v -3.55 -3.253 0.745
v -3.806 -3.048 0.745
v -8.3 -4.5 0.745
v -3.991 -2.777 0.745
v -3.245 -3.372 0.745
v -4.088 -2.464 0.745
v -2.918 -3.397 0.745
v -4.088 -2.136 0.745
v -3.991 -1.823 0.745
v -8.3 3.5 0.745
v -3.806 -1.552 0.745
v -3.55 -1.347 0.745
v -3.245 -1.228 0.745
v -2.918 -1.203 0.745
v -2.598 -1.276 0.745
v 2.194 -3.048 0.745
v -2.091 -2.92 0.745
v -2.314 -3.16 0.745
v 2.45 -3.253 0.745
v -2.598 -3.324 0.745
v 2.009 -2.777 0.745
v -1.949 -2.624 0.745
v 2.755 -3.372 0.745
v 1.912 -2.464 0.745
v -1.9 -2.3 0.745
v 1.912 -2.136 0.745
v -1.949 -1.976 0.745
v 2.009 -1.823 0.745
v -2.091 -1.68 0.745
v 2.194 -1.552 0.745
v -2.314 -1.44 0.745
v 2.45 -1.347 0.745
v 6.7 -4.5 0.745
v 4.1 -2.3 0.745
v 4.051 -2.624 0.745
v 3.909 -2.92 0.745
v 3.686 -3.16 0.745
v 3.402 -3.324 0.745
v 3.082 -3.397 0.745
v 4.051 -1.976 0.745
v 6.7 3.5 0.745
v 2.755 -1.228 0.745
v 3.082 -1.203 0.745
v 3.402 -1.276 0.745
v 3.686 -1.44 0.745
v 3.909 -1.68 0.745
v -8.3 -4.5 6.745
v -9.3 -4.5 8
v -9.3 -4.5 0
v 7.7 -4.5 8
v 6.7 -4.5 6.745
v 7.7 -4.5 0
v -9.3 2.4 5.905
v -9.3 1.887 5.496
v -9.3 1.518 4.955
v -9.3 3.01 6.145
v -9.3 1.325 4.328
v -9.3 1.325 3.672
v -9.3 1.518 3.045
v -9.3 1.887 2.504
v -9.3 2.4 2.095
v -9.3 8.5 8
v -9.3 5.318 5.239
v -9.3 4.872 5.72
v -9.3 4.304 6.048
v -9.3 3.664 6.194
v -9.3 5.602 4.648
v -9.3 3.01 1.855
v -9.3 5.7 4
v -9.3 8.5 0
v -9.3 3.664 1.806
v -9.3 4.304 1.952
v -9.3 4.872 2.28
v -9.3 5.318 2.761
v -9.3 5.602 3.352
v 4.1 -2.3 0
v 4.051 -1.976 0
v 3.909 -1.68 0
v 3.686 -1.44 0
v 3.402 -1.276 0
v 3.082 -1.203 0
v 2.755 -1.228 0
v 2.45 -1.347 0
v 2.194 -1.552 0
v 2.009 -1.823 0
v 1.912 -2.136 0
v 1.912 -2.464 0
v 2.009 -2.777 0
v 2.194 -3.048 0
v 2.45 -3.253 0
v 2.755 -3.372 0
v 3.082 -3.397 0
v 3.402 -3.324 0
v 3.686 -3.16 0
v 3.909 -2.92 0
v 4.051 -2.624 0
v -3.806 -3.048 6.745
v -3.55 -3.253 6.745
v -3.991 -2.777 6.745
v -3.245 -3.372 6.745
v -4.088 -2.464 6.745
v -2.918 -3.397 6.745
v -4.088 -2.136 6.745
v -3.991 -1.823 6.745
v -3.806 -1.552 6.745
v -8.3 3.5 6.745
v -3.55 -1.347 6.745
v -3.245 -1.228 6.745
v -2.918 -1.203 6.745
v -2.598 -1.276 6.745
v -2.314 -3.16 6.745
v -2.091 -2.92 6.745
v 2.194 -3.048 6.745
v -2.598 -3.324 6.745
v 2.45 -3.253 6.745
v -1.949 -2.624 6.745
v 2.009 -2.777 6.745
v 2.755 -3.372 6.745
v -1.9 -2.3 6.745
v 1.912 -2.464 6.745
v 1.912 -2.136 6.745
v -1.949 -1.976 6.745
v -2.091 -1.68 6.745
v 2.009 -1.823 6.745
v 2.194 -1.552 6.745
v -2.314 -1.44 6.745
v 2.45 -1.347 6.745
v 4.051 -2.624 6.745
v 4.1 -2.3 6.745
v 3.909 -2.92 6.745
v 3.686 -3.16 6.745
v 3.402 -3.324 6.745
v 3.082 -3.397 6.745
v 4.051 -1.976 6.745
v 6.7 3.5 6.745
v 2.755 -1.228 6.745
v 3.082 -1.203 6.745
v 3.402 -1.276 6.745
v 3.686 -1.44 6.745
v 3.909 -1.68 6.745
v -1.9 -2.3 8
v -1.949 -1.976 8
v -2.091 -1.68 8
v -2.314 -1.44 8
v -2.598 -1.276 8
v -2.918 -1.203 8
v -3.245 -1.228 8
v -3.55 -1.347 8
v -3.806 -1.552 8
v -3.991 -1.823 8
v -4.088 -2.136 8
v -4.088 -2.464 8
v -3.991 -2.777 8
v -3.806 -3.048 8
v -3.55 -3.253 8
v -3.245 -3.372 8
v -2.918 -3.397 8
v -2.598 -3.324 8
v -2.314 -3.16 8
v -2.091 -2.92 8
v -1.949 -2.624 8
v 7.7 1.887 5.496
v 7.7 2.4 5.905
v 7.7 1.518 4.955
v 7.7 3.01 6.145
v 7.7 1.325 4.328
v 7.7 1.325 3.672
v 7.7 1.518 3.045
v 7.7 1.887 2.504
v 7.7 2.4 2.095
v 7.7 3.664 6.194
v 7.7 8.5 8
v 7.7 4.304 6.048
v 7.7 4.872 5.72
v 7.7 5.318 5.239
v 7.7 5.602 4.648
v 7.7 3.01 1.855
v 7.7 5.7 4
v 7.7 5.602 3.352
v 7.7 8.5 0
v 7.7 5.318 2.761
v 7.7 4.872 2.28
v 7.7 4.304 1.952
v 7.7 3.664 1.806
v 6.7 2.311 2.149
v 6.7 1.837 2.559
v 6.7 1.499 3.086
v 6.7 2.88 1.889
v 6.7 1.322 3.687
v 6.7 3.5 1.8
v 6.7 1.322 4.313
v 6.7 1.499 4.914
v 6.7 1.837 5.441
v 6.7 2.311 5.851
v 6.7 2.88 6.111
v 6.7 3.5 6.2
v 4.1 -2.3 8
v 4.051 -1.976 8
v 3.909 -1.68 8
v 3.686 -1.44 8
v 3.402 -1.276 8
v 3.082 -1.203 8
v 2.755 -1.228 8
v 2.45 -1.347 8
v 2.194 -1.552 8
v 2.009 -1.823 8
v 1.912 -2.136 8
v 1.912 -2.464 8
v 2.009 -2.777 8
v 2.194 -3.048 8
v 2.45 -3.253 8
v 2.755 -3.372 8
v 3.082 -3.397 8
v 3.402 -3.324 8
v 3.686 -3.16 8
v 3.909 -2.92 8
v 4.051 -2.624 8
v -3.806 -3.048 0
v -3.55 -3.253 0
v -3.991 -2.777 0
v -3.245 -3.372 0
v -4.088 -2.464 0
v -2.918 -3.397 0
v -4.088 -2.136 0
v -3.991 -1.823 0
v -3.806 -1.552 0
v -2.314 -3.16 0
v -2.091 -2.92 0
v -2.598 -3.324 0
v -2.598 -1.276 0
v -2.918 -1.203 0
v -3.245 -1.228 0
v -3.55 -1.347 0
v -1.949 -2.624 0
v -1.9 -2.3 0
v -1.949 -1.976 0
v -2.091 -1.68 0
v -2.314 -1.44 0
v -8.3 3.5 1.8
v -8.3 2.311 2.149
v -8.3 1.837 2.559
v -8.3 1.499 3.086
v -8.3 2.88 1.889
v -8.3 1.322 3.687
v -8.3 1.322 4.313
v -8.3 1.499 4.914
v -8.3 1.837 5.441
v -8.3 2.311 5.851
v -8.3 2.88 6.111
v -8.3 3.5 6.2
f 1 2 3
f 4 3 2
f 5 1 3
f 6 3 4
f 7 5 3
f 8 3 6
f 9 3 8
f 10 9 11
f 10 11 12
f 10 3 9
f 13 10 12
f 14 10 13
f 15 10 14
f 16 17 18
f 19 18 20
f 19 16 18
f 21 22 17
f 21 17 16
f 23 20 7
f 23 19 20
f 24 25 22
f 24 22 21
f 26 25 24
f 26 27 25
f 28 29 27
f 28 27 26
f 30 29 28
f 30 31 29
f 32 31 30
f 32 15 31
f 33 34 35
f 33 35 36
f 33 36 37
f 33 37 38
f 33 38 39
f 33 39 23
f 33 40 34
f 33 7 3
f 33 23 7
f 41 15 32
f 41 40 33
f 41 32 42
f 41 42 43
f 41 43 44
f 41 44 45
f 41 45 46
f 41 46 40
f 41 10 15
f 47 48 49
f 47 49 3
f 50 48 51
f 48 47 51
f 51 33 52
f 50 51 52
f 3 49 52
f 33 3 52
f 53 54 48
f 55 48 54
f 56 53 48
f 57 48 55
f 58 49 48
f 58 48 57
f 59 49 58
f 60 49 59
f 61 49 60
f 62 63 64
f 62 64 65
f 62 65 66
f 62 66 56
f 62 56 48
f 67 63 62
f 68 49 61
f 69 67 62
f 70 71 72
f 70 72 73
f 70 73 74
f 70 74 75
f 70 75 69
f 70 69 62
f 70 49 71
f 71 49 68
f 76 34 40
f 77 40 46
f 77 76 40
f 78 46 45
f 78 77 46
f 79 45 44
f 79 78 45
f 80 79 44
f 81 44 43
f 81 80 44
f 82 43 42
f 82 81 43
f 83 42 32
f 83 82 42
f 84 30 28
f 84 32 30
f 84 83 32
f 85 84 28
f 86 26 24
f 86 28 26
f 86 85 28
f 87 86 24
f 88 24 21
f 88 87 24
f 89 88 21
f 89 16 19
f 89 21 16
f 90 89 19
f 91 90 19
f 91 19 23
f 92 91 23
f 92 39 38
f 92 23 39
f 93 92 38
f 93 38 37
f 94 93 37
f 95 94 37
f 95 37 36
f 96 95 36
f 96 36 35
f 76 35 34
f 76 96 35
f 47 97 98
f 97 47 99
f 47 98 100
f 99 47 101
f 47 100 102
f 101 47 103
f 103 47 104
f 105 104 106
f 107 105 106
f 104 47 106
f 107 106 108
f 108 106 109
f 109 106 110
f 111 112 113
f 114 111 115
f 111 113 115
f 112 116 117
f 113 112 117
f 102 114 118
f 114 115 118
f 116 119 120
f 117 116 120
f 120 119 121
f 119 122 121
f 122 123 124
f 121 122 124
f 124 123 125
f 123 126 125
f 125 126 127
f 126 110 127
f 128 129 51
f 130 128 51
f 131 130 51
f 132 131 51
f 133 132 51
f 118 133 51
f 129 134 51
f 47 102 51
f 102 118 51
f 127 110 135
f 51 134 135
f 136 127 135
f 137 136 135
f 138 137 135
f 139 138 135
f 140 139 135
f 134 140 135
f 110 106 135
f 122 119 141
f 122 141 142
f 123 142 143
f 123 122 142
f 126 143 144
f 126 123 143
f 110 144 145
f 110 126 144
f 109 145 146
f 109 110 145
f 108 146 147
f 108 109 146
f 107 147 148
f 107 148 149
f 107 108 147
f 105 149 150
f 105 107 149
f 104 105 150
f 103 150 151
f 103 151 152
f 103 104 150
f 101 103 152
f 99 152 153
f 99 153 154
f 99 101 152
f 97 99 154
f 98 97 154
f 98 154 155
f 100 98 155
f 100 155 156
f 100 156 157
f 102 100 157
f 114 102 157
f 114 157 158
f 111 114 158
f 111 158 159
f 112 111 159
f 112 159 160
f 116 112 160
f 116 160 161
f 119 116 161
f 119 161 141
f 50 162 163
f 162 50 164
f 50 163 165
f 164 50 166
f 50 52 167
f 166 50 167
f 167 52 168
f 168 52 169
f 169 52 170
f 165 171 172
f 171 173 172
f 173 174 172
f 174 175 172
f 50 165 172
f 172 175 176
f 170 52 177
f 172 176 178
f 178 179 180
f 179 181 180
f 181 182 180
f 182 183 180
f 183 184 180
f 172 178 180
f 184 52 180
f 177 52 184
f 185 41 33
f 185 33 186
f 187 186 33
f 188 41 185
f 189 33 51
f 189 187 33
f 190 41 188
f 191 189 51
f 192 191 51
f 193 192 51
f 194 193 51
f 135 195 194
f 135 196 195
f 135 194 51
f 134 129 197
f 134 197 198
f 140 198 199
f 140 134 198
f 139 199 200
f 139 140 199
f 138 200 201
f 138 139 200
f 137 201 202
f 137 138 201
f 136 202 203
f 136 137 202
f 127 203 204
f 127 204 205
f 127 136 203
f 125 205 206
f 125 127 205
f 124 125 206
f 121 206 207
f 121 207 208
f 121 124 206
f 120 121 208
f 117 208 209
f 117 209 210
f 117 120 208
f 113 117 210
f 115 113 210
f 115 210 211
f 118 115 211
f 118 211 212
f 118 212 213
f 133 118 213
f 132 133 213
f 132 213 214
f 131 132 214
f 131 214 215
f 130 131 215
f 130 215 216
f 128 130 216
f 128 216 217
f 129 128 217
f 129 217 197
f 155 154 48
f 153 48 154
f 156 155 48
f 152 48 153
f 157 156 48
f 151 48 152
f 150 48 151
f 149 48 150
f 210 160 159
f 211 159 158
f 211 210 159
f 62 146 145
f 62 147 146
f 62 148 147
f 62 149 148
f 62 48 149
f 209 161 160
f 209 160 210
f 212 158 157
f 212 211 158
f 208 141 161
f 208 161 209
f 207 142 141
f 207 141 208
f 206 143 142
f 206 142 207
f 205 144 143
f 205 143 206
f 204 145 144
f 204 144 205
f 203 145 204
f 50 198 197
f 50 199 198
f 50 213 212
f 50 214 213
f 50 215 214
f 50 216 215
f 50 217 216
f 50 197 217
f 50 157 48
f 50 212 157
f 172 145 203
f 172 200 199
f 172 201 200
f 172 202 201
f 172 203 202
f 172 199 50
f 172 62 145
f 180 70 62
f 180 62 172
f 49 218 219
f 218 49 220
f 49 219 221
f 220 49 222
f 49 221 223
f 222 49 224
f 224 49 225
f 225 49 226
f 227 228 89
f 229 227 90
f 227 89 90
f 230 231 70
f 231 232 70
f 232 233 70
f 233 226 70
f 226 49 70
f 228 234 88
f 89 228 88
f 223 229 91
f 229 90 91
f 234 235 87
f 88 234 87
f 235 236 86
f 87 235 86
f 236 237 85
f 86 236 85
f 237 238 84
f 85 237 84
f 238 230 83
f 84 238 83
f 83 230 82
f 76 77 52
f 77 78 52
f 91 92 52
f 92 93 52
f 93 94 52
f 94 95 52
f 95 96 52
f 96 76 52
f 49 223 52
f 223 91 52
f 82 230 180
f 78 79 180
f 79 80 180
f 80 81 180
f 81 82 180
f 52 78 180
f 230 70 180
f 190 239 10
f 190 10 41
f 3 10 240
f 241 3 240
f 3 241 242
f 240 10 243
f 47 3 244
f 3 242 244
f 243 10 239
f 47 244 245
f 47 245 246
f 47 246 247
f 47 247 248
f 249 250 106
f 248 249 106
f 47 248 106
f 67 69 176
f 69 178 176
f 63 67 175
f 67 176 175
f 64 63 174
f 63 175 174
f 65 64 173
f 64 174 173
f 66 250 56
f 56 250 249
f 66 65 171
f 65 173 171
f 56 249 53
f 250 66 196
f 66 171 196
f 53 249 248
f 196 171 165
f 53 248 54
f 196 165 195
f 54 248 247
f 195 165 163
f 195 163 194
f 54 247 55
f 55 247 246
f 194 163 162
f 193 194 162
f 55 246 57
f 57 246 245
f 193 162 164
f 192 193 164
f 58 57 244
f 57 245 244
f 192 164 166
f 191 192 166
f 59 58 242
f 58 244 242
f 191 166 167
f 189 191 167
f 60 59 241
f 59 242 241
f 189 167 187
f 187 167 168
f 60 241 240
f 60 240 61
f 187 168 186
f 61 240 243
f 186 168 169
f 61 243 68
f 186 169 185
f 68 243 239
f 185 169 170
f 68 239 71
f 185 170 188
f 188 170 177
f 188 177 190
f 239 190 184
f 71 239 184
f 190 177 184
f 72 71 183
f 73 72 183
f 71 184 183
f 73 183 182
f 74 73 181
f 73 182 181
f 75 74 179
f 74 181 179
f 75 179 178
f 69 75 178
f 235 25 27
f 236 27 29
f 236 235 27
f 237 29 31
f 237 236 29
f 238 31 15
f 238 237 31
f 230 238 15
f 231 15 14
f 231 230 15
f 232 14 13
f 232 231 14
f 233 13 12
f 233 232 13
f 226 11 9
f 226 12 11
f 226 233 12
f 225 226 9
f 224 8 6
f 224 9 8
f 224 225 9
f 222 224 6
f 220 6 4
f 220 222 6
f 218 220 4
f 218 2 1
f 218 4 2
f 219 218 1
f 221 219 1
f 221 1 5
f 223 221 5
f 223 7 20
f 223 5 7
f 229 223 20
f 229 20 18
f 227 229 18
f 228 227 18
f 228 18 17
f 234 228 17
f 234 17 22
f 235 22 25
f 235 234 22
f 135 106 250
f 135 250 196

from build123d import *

# Parameters (mm, degrees)
F0_W          = 17
F0_H          = 13
F0_W_2        = 12.7
F0_H_2        = 7
F0_R          = 1.1
F1_DEPTH      = 8
F2_W          = 15
F2_H          = 6
F3_DEPTH      = 4.501
F3_DEPTH_BACK = 3.5
F4_R          = 2.2
F5_DEPTH      = 9.301
F5_DEPTH_BACK = 7.701


with BuildPart() as f1:
    # F0 (on Top) → F1 (new body)
    with BuildSketch(Plane.XY):
        with Locations((-0.8, 2)):
            Rectangle(F0_W, F0_H)
        Rectangle(F0_W_2, F0_H_2, mode=Mode.SUBTRACT)
        Rectangle(F0_W_2, F0_H_2)
        with Locations((-3, -2.3)):
            Circle(F0_R, mode=Mode.SUBTRACT)
        with Locations((3, -2.3)):
            Circle(F0_R, mode=Mode.SUBTRACT)
    extrude(amount=F1_DEPTH)

    # F2 (on Front) → F3 (cut, two sides)
    with BuildSketch(Plane.XZ) as f3_sk:
        with Locations((-0.8, 3.7450972334)):
            Rectangle(F2_W, F2_H)
    extrude(amount=F3_DEPTH, mode=Mode.SUBTRACT)
    extrude(f3_sk.sketch, amount=-F3_DEPTH_BACK, mode=Mode.SUBTRACT)

    # F4 (on Right) → F5 (cut, two sides)
    with BuildSketch(Plane.YZ) as f5_sk:
        with Locations((3.5, 4)):
            Circle(F4_R)
    extrude(amount=-F5_DEPTH, mode=Mode.SUBTRACT)
    extrude(f5_sk.sketch, amount=F5_DEPTH_BACK, mode=Mode.SUBTRACT)


solid = f1.part
